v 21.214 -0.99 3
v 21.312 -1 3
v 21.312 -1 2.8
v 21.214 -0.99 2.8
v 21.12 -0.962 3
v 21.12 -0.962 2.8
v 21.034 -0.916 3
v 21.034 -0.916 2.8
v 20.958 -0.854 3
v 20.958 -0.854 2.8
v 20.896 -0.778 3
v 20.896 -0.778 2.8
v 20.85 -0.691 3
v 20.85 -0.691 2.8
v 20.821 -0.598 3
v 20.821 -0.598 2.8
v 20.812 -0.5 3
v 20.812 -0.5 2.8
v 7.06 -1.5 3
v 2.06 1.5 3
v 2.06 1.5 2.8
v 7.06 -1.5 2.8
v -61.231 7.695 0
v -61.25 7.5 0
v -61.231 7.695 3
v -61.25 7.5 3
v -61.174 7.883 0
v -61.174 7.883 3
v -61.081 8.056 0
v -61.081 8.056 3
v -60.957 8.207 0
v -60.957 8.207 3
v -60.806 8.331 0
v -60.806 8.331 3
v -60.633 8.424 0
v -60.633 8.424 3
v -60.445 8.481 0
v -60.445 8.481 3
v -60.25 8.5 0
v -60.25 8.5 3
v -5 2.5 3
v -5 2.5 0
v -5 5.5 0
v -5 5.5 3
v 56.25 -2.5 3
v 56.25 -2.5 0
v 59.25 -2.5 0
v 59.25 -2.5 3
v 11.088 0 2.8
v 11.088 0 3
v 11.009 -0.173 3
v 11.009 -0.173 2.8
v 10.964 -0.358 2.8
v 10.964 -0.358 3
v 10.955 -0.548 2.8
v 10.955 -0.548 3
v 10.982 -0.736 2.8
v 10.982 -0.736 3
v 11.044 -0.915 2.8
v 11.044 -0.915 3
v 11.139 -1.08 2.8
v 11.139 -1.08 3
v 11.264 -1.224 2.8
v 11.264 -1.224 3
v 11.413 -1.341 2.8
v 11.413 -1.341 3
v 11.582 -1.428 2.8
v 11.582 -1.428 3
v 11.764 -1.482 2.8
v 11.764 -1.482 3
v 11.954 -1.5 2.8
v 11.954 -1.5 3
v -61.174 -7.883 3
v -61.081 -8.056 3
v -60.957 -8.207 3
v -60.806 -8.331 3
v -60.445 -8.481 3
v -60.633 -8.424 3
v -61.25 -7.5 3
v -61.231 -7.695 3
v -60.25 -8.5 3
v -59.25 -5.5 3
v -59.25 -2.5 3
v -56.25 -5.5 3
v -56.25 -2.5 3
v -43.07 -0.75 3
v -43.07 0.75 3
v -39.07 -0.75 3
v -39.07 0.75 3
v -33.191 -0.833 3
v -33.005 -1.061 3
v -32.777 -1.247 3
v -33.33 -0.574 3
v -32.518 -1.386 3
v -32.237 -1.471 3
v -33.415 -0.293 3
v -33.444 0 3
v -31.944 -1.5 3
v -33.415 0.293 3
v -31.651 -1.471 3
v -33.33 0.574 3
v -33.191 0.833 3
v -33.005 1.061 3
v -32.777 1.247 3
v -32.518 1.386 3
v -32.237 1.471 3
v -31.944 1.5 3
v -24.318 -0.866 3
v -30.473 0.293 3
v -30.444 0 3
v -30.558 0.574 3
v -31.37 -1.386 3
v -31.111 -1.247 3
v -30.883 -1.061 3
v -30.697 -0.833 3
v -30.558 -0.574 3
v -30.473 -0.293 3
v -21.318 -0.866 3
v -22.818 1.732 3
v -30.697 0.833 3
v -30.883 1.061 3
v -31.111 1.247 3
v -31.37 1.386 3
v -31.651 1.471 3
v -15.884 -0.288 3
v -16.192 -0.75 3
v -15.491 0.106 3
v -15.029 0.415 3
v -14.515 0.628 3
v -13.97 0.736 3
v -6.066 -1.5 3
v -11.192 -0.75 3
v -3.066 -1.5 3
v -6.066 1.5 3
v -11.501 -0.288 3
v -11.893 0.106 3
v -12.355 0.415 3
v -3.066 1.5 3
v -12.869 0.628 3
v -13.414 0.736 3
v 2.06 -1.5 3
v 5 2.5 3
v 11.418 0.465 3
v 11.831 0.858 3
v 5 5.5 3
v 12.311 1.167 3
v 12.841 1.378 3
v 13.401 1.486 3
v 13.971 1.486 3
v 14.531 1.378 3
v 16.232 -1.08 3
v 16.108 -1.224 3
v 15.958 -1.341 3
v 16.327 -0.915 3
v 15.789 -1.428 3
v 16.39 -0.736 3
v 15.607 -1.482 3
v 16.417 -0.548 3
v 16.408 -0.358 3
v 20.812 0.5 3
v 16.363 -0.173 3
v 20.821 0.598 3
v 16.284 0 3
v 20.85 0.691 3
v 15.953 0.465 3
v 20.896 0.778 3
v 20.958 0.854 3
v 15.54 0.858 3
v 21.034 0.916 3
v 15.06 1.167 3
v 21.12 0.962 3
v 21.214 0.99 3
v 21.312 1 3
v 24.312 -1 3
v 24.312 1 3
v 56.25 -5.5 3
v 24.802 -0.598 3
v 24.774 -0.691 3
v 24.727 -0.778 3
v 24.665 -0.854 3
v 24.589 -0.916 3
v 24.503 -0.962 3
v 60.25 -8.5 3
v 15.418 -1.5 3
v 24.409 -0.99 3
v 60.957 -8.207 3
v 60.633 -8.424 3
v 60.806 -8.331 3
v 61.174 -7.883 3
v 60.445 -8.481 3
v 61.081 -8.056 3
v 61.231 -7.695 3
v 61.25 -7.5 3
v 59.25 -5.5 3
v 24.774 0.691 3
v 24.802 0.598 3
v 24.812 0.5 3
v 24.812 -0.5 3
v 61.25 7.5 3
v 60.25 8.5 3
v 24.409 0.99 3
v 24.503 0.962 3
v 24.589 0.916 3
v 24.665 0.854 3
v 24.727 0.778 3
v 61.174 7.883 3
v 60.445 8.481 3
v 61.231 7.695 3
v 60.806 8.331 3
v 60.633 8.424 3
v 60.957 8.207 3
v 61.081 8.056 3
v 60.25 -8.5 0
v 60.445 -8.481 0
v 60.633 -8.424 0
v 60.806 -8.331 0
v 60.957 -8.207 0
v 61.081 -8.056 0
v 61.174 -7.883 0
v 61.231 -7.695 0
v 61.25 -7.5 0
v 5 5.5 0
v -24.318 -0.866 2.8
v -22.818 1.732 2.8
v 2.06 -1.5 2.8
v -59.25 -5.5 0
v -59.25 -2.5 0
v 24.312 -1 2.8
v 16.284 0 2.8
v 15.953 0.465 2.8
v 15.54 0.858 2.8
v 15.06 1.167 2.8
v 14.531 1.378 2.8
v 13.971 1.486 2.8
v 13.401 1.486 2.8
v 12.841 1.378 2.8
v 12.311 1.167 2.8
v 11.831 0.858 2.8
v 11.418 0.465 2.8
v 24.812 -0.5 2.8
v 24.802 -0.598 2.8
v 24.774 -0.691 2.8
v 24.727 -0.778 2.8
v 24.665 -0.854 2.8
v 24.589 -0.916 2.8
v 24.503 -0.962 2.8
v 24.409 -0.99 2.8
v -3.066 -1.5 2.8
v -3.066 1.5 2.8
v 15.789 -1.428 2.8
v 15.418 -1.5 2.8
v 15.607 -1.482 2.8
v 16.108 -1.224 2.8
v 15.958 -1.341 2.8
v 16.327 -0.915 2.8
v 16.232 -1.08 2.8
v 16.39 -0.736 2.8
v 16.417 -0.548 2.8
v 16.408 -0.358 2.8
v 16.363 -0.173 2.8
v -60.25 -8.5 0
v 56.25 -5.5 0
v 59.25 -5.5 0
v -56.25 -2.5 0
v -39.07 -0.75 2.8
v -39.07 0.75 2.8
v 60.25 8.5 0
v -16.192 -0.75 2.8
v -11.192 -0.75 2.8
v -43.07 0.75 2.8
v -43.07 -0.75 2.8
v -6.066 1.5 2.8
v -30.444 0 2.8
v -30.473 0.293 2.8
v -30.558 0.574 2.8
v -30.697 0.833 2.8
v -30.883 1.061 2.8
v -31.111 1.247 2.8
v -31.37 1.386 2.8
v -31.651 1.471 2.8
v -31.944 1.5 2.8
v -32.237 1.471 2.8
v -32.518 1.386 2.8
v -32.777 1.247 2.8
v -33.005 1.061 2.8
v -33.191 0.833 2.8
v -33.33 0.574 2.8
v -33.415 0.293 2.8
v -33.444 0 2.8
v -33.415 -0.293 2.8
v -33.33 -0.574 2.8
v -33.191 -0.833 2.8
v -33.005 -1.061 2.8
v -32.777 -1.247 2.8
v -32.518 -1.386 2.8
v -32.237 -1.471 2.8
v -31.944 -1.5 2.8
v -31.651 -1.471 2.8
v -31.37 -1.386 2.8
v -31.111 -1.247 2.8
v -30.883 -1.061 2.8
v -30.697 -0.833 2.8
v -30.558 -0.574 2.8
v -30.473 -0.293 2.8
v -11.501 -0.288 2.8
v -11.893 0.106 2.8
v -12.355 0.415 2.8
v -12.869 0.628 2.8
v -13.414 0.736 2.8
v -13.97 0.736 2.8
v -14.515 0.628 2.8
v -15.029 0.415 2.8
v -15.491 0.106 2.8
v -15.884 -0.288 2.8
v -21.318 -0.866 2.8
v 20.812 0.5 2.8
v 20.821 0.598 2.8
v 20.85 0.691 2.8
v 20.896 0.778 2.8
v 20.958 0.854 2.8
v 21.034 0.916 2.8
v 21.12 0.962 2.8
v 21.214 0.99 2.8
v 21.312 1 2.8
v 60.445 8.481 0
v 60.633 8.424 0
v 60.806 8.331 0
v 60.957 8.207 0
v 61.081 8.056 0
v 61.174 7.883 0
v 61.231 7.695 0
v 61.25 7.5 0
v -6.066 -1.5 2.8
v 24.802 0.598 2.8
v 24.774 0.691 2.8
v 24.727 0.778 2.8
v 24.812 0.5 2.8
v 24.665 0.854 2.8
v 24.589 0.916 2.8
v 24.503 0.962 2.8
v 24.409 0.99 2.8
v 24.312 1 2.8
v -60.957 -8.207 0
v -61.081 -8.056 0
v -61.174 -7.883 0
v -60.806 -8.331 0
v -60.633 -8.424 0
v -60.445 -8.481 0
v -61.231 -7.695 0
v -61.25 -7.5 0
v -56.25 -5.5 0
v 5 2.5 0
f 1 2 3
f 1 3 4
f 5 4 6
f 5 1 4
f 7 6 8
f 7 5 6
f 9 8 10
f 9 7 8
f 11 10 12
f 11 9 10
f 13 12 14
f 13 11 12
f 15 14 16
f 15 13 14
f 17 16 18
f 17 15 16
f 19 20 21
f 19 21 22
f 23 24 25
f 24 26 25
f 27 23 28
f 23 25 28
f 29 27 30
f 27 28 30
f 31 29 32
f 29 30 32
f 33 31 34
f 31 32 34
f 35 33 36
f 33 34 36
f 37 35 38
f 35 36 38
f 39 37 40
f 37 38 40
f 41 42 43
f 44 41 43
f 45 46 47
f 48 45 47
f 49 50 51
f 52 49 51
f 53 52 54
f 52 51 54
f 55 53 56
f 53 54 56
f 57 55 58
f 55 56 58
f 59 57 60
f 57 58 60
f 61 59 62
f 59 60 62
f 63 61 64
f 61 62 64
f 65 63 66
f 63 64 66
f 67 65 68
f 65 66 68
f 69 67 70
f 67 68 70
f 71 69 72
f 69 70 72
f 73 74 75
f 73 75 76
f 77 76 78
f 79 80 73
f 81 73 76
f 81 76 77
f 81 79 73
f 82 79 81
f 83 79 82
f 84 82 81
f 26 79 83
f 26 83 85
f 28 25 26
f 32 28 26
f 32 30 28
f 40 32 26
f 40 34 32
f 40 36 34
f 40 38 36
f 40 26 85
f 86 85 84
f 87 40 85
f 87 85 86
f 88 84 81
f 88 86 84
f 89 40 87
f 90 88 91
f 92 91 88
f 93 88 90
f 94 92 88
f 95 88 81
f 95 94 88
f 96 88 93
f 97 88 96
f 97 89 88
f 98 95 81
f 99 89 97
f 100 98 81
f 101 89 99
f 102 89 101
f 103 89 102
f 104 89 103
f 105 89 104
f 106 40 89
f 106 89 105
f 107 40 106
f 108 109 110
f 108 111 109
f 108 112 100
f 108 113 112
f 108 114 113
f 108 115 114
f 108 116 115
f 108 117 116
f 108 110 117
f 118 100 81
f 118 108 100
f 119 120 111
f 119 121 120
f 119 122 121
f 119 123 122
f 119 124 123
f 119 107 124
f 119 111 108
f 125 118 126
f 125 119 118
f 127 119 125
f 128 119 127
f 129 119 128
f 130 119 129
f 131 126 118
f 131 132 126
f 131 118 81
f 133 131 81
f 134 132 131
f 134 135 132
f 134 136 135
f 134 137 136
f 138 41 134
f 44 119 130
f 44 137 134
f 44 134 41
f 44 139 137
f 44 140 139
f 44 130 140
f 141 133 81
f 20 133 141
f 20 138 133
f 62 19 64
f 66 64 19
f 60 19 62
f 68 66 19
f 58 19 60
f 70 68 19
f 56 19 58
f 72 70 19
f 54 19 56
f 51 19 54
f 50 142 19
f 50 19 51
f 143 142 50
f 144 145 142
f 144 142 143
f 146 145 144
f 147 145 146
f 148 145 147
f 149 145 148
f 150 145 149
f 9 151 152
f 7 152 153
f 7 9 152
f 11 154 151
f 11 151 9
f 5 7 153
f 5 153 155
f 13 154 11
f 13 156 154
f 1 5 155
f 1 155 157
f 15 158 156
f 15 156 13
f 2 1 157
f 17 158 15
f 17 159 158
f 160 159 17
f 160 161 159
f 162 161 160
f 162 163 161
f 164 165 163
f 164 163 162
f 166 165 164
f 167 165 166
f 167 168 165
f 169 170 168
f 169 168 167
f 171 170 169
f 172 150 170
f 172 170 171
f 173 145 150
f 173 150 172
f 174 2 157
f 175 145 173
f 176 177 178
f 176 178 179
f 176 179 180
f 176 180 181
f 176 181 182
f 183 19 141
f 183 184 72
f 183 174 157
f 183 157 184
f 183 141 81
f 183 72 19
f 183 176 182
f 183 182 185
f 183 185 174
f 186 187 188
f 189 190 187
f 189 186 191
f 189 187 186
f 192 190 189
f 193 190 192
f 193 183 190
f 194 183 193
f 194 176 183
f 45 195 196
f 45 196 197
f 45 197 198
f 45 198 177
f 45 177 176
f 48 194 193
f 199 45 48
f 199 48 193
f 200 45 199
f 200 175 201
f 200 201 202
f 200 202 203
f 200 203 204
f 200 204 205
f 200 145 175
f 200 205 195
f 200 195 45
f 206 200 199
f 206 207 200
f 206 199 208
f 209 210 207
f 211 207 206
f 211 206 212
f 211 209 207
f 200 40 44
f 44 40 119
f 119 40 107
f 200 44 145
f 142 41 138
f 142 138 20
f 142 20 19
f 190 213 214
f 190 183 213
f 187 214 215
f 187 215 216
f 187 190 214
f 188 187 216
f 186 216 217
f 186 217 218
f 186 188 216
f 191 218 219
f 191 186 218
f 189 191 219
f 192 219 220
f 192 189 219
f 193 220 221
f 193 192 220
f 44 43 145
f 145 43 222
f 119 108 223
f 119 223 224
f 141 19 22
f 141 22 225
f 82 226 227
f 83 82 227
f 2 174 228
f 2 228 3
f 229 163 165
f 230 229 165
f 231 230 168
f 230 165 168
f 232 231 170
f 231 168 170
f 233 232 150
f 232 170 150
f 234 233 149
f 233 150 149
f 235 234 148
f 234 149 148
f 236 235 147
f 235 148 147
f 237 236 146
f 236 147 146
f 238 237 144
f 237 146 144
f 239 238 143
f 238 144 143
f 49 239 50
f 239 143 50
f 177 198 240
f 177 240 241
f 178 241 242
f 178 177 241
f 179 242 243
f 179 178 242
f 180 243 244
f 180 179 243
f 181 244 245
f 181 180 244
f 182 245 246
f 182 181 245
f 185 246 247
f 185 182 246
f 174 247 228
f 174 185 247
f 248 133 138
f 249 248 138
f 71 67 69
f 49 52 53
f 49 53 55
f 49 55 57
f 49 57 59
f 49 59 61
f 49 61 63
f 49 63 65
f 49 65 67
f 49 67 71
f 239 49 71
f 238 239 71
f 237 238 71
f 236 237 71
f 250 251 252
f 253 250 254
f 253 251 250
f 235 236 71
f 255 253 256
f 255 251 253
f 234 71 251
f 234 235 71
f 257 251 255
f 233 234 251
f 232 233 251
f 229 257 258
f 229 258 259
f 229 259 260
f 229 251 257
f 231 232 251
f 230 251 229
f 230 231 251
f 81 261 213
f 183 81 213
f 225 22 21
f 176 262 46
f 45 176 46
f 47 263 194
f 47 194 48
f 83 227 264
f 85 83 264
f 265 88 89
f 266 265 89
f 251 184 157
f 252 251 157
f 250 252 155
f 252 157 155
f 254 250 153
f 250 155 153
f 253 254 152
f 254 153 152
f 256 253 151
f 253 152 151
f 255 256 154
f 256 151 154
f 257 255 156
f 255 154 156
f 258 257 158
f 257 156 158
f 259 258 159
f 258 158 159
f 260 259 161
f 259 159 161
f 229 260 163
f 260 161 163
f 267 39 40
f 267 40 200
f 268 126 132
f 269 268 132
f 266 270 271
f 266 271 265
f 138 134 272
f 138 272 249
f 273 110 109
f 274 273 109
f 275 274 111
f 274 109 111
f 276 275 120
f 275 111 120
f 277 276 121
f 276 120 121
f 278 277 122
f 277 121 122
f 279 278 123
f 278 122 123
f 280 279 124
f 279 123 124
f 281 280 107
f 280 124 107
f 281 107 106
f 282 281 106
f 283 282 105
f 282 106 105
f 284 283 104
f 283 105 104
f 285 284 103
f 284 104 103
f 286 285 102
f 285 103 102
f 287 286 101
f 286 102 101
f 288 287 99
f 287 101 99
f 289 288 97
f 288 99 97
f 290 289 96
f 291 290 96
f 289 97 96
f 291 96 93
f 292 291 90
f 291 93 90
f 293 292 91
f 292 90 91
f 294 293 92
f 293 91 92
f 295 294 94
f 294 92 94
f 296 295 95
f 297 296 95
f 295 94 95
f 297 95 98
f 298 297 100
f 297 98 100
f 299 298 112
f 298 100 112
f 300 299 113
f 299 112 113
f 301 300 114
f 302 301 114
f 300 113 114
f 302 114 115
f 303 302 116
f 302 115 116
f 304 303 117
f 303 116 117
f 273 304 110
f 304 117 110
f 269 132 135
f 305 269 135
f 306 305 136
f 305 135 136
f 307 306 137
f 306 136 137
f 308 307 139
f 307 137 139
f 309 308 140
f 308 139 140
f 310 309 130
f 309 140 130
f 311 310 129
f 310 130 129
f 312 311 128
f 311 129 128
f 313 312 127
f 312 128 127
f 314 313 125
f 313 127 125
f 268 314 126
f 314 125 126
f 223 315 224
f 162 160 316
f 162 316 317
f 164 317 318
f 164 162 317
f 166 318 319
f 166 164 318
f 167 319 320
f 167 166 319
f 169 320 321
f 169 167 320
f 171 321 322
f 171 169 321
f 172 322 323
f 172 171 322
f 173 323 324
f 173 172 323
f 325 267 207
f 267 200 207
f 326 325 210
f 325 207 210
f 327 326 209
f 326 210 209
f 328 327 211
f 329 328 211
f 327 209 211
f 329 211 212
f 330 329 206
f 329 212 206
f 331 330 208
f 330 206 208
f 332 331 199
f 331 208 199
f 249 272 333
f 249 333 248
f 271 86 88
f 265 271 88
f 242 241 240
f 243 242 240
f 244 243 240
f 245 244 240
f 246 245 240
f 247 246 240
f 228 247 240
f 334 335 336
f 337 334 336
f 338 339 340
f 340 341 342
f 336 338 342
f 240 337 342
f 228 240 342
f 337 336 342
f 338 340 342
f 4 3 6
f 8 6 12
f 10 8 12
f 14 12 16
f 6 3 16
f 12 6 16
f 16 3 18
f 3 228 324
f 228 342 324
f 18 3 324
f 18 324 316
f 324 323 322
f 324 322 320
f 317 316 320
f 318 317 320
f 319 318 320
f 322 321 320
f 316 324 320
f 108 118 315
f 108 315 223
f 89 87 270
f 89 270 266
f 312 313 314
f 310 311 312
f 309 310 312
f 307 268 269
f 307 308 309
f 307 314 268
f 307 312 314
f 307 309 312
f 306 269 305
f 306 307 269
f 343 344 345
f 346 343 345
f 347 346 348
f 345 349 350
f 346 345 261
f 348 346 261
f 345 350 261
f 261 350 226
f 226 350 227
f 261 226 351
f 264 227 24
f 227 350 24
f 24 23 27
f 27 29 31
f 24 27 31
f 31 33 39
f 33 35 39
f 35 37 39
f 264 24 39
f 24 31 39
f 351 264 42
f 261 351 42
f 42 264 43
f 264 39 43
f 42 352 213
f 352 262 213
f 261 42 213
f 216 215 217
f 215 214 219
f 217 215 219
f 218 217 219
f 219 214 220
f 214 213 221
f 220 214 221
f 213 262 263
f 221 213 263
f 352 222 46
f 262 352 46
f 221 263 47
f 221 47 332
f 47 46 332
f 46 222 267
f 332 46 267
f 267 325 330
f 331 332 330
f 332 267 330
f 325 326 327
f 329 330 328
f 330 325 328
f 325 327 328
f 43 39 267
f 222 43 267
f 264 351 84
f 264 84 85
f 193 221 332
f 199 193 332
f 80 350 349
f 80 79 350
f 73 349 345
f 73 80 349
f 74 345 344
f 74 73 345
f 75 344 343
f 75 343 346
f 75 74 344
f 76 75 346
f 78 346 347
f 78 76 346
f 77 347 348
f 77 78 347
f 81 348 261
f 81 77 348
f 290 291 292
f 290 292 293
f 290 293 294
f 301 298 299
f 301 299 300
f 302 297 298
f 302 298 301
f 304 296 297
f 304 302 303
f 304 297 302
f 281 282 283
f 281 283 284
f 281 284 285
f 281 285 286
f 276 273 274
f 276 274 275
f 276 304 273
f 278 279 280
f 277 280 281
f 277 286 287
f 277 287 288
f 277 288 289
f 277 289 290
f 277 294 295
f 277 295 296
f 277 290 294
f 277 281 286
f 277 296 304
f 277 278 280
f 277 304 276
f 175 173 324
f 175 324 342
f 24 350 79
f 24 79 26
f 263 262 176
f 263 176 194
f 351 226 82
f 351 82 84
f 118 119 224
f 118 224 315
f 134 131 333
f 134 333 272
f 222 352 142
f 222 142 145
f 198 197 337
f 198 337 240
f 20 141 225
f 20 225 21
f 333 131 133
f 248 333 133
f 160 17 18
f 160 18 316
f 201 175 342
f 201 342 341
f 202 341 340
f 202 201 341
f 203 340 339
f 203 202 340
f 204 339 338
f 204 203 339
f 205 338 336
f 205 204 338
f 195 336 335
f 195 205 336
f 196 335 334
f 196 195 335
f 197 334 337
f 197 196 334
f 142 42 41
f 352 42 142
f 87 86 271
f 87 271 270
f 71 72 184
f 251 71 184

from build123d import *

# Parameters (mm, degrees)
SKETCH_1_W          = 122.5
SKETCH_1_H          = 17
SKETCH_1_W_2        = 10
SKETCH_1_H_2        = 3
SKETCH_1_W_3        = 3
EXTRUDE_1_DEPTH     = 3
FILLET_1_R          = 1
SKETCH_2_R          = 1.5
SKETCH_2_W          = 4
SKETCH_2_H          = 1.5
SKETCH_2_W_2        = 3
SKETCH_2_H_2        = 3
CUT_EXTRUDE_1_DEPTH = 0.2


with BuildPart() as part:
    # Эскиз1 → Бобышка-Вытянуть1 (new body)
    with BuildSketch(Plane.XY):
        Rectangle(SKETCH_1_W, SKETCH_1_H)
        with Locations((0, 4)):
            Rectangle(SKETCH_1_W_2, SKETCH_1_H_2, mode=Mode.SUBTRACT)
        with Locations((57.75, -4)):
            Rectangle(SKETCH_1_W_3, SKETCH_1_H_2, mode=Mode.SUBTRACT)
        with Locations((-57.75, -4)):
            Rectangle(SKETCH_1_W_3, SKETCH_1_H_2, mode=Mode.SUBTRACT)
    extrude(amount=EXTRUDE_1_DEPTH)

    # Скругление1
    fillet_1_edges = [part.edges().sort_by_distance(p)[0] for p in [
        (61.25, -8.5, 1.5),
        (-61.25, -8.5, 1.5),
        (-61.25, 8.5, 1.5),
        (61.25, 8.5, 1.5),
    ]]
    fillet(fillet_1_edges, radius=FILLET_1_R)

    # Эскиз2 → Вырез-Вытянуть1 (cut)
    with BuildSketch(Plane.XY.offset(3)):
        with Locations((-31.944049889, 0)):
            Circle(SKETCH_2_R)
        Polygon((-22.818099779, 1.732050808), (-21.318099779, -0.866025404), (-24.318099779, -0.866025404), align=None)
        with Locations((-41.07, 0)):
            Rectangle(SKETCH_2_W, SKETCH_2_H)
        with BuildLine():
            Line((-16.192149668, -0.75), (-11.192149668, -0.75))
            ThreePointArc((-11.192149668, -0.75), (-13.692149668, 0.75), (-16.192149668, -0.75))
        make_face()
        with Locations((-4.566199557, 0)):
            Rectangle(SKETCH_2_W_2, SKETCH_2_H_2)
        Polygon((2.059750554, -1.5), (2.059750554, 1.5), (7.059750554, -1.5), align=None)
        with BuildLine():
            Line((11.953649857, -1.5), (15.417751472, -1.5))
            ThreePointArc((15.417751472, -1.5), (16.283776876, -1), (16.283776876, 0))
            ThreePointArc((16.283776876, 0), (13.685700664, 1.5), (11.087624453, 0))
            ThreePointArc((11.087624453, 0), (11.087624453, -1), (11.953649857, -1.5))
        make_face()
        with BuildLine():
            Line((21.311650775, 1), (24.311650775, 1))
            ThreePointArc((24.311650775, 1), (24.665204166, 0.853553391), (24.811650775, 0.5))
            Line((24.811650775, 0.5), (24.811650775, -0.5))
            ThreePointArc((24.811650775, -0.5), (24.665204166, -0.853553391), (24.311650775, -1))
            Line((24.311650775, -1), (21.311650775, -1))
            ThreePointArc((21.311650775, -1), (20.958097384, -0.853553391), (20.811650775, -0.5))
            Line((20.811650775, -0.5), (20.811650775, 0.5))
            ThreePointArc((20.811650775, 0.5), (20.958097384, 0.853553391), (21.311650775, 1))
        make_face()
    extrude(amount=-CUT_EXTRUDE_1_DEPTH, mode=Mode.SUBTRACT)


solid = part.part
